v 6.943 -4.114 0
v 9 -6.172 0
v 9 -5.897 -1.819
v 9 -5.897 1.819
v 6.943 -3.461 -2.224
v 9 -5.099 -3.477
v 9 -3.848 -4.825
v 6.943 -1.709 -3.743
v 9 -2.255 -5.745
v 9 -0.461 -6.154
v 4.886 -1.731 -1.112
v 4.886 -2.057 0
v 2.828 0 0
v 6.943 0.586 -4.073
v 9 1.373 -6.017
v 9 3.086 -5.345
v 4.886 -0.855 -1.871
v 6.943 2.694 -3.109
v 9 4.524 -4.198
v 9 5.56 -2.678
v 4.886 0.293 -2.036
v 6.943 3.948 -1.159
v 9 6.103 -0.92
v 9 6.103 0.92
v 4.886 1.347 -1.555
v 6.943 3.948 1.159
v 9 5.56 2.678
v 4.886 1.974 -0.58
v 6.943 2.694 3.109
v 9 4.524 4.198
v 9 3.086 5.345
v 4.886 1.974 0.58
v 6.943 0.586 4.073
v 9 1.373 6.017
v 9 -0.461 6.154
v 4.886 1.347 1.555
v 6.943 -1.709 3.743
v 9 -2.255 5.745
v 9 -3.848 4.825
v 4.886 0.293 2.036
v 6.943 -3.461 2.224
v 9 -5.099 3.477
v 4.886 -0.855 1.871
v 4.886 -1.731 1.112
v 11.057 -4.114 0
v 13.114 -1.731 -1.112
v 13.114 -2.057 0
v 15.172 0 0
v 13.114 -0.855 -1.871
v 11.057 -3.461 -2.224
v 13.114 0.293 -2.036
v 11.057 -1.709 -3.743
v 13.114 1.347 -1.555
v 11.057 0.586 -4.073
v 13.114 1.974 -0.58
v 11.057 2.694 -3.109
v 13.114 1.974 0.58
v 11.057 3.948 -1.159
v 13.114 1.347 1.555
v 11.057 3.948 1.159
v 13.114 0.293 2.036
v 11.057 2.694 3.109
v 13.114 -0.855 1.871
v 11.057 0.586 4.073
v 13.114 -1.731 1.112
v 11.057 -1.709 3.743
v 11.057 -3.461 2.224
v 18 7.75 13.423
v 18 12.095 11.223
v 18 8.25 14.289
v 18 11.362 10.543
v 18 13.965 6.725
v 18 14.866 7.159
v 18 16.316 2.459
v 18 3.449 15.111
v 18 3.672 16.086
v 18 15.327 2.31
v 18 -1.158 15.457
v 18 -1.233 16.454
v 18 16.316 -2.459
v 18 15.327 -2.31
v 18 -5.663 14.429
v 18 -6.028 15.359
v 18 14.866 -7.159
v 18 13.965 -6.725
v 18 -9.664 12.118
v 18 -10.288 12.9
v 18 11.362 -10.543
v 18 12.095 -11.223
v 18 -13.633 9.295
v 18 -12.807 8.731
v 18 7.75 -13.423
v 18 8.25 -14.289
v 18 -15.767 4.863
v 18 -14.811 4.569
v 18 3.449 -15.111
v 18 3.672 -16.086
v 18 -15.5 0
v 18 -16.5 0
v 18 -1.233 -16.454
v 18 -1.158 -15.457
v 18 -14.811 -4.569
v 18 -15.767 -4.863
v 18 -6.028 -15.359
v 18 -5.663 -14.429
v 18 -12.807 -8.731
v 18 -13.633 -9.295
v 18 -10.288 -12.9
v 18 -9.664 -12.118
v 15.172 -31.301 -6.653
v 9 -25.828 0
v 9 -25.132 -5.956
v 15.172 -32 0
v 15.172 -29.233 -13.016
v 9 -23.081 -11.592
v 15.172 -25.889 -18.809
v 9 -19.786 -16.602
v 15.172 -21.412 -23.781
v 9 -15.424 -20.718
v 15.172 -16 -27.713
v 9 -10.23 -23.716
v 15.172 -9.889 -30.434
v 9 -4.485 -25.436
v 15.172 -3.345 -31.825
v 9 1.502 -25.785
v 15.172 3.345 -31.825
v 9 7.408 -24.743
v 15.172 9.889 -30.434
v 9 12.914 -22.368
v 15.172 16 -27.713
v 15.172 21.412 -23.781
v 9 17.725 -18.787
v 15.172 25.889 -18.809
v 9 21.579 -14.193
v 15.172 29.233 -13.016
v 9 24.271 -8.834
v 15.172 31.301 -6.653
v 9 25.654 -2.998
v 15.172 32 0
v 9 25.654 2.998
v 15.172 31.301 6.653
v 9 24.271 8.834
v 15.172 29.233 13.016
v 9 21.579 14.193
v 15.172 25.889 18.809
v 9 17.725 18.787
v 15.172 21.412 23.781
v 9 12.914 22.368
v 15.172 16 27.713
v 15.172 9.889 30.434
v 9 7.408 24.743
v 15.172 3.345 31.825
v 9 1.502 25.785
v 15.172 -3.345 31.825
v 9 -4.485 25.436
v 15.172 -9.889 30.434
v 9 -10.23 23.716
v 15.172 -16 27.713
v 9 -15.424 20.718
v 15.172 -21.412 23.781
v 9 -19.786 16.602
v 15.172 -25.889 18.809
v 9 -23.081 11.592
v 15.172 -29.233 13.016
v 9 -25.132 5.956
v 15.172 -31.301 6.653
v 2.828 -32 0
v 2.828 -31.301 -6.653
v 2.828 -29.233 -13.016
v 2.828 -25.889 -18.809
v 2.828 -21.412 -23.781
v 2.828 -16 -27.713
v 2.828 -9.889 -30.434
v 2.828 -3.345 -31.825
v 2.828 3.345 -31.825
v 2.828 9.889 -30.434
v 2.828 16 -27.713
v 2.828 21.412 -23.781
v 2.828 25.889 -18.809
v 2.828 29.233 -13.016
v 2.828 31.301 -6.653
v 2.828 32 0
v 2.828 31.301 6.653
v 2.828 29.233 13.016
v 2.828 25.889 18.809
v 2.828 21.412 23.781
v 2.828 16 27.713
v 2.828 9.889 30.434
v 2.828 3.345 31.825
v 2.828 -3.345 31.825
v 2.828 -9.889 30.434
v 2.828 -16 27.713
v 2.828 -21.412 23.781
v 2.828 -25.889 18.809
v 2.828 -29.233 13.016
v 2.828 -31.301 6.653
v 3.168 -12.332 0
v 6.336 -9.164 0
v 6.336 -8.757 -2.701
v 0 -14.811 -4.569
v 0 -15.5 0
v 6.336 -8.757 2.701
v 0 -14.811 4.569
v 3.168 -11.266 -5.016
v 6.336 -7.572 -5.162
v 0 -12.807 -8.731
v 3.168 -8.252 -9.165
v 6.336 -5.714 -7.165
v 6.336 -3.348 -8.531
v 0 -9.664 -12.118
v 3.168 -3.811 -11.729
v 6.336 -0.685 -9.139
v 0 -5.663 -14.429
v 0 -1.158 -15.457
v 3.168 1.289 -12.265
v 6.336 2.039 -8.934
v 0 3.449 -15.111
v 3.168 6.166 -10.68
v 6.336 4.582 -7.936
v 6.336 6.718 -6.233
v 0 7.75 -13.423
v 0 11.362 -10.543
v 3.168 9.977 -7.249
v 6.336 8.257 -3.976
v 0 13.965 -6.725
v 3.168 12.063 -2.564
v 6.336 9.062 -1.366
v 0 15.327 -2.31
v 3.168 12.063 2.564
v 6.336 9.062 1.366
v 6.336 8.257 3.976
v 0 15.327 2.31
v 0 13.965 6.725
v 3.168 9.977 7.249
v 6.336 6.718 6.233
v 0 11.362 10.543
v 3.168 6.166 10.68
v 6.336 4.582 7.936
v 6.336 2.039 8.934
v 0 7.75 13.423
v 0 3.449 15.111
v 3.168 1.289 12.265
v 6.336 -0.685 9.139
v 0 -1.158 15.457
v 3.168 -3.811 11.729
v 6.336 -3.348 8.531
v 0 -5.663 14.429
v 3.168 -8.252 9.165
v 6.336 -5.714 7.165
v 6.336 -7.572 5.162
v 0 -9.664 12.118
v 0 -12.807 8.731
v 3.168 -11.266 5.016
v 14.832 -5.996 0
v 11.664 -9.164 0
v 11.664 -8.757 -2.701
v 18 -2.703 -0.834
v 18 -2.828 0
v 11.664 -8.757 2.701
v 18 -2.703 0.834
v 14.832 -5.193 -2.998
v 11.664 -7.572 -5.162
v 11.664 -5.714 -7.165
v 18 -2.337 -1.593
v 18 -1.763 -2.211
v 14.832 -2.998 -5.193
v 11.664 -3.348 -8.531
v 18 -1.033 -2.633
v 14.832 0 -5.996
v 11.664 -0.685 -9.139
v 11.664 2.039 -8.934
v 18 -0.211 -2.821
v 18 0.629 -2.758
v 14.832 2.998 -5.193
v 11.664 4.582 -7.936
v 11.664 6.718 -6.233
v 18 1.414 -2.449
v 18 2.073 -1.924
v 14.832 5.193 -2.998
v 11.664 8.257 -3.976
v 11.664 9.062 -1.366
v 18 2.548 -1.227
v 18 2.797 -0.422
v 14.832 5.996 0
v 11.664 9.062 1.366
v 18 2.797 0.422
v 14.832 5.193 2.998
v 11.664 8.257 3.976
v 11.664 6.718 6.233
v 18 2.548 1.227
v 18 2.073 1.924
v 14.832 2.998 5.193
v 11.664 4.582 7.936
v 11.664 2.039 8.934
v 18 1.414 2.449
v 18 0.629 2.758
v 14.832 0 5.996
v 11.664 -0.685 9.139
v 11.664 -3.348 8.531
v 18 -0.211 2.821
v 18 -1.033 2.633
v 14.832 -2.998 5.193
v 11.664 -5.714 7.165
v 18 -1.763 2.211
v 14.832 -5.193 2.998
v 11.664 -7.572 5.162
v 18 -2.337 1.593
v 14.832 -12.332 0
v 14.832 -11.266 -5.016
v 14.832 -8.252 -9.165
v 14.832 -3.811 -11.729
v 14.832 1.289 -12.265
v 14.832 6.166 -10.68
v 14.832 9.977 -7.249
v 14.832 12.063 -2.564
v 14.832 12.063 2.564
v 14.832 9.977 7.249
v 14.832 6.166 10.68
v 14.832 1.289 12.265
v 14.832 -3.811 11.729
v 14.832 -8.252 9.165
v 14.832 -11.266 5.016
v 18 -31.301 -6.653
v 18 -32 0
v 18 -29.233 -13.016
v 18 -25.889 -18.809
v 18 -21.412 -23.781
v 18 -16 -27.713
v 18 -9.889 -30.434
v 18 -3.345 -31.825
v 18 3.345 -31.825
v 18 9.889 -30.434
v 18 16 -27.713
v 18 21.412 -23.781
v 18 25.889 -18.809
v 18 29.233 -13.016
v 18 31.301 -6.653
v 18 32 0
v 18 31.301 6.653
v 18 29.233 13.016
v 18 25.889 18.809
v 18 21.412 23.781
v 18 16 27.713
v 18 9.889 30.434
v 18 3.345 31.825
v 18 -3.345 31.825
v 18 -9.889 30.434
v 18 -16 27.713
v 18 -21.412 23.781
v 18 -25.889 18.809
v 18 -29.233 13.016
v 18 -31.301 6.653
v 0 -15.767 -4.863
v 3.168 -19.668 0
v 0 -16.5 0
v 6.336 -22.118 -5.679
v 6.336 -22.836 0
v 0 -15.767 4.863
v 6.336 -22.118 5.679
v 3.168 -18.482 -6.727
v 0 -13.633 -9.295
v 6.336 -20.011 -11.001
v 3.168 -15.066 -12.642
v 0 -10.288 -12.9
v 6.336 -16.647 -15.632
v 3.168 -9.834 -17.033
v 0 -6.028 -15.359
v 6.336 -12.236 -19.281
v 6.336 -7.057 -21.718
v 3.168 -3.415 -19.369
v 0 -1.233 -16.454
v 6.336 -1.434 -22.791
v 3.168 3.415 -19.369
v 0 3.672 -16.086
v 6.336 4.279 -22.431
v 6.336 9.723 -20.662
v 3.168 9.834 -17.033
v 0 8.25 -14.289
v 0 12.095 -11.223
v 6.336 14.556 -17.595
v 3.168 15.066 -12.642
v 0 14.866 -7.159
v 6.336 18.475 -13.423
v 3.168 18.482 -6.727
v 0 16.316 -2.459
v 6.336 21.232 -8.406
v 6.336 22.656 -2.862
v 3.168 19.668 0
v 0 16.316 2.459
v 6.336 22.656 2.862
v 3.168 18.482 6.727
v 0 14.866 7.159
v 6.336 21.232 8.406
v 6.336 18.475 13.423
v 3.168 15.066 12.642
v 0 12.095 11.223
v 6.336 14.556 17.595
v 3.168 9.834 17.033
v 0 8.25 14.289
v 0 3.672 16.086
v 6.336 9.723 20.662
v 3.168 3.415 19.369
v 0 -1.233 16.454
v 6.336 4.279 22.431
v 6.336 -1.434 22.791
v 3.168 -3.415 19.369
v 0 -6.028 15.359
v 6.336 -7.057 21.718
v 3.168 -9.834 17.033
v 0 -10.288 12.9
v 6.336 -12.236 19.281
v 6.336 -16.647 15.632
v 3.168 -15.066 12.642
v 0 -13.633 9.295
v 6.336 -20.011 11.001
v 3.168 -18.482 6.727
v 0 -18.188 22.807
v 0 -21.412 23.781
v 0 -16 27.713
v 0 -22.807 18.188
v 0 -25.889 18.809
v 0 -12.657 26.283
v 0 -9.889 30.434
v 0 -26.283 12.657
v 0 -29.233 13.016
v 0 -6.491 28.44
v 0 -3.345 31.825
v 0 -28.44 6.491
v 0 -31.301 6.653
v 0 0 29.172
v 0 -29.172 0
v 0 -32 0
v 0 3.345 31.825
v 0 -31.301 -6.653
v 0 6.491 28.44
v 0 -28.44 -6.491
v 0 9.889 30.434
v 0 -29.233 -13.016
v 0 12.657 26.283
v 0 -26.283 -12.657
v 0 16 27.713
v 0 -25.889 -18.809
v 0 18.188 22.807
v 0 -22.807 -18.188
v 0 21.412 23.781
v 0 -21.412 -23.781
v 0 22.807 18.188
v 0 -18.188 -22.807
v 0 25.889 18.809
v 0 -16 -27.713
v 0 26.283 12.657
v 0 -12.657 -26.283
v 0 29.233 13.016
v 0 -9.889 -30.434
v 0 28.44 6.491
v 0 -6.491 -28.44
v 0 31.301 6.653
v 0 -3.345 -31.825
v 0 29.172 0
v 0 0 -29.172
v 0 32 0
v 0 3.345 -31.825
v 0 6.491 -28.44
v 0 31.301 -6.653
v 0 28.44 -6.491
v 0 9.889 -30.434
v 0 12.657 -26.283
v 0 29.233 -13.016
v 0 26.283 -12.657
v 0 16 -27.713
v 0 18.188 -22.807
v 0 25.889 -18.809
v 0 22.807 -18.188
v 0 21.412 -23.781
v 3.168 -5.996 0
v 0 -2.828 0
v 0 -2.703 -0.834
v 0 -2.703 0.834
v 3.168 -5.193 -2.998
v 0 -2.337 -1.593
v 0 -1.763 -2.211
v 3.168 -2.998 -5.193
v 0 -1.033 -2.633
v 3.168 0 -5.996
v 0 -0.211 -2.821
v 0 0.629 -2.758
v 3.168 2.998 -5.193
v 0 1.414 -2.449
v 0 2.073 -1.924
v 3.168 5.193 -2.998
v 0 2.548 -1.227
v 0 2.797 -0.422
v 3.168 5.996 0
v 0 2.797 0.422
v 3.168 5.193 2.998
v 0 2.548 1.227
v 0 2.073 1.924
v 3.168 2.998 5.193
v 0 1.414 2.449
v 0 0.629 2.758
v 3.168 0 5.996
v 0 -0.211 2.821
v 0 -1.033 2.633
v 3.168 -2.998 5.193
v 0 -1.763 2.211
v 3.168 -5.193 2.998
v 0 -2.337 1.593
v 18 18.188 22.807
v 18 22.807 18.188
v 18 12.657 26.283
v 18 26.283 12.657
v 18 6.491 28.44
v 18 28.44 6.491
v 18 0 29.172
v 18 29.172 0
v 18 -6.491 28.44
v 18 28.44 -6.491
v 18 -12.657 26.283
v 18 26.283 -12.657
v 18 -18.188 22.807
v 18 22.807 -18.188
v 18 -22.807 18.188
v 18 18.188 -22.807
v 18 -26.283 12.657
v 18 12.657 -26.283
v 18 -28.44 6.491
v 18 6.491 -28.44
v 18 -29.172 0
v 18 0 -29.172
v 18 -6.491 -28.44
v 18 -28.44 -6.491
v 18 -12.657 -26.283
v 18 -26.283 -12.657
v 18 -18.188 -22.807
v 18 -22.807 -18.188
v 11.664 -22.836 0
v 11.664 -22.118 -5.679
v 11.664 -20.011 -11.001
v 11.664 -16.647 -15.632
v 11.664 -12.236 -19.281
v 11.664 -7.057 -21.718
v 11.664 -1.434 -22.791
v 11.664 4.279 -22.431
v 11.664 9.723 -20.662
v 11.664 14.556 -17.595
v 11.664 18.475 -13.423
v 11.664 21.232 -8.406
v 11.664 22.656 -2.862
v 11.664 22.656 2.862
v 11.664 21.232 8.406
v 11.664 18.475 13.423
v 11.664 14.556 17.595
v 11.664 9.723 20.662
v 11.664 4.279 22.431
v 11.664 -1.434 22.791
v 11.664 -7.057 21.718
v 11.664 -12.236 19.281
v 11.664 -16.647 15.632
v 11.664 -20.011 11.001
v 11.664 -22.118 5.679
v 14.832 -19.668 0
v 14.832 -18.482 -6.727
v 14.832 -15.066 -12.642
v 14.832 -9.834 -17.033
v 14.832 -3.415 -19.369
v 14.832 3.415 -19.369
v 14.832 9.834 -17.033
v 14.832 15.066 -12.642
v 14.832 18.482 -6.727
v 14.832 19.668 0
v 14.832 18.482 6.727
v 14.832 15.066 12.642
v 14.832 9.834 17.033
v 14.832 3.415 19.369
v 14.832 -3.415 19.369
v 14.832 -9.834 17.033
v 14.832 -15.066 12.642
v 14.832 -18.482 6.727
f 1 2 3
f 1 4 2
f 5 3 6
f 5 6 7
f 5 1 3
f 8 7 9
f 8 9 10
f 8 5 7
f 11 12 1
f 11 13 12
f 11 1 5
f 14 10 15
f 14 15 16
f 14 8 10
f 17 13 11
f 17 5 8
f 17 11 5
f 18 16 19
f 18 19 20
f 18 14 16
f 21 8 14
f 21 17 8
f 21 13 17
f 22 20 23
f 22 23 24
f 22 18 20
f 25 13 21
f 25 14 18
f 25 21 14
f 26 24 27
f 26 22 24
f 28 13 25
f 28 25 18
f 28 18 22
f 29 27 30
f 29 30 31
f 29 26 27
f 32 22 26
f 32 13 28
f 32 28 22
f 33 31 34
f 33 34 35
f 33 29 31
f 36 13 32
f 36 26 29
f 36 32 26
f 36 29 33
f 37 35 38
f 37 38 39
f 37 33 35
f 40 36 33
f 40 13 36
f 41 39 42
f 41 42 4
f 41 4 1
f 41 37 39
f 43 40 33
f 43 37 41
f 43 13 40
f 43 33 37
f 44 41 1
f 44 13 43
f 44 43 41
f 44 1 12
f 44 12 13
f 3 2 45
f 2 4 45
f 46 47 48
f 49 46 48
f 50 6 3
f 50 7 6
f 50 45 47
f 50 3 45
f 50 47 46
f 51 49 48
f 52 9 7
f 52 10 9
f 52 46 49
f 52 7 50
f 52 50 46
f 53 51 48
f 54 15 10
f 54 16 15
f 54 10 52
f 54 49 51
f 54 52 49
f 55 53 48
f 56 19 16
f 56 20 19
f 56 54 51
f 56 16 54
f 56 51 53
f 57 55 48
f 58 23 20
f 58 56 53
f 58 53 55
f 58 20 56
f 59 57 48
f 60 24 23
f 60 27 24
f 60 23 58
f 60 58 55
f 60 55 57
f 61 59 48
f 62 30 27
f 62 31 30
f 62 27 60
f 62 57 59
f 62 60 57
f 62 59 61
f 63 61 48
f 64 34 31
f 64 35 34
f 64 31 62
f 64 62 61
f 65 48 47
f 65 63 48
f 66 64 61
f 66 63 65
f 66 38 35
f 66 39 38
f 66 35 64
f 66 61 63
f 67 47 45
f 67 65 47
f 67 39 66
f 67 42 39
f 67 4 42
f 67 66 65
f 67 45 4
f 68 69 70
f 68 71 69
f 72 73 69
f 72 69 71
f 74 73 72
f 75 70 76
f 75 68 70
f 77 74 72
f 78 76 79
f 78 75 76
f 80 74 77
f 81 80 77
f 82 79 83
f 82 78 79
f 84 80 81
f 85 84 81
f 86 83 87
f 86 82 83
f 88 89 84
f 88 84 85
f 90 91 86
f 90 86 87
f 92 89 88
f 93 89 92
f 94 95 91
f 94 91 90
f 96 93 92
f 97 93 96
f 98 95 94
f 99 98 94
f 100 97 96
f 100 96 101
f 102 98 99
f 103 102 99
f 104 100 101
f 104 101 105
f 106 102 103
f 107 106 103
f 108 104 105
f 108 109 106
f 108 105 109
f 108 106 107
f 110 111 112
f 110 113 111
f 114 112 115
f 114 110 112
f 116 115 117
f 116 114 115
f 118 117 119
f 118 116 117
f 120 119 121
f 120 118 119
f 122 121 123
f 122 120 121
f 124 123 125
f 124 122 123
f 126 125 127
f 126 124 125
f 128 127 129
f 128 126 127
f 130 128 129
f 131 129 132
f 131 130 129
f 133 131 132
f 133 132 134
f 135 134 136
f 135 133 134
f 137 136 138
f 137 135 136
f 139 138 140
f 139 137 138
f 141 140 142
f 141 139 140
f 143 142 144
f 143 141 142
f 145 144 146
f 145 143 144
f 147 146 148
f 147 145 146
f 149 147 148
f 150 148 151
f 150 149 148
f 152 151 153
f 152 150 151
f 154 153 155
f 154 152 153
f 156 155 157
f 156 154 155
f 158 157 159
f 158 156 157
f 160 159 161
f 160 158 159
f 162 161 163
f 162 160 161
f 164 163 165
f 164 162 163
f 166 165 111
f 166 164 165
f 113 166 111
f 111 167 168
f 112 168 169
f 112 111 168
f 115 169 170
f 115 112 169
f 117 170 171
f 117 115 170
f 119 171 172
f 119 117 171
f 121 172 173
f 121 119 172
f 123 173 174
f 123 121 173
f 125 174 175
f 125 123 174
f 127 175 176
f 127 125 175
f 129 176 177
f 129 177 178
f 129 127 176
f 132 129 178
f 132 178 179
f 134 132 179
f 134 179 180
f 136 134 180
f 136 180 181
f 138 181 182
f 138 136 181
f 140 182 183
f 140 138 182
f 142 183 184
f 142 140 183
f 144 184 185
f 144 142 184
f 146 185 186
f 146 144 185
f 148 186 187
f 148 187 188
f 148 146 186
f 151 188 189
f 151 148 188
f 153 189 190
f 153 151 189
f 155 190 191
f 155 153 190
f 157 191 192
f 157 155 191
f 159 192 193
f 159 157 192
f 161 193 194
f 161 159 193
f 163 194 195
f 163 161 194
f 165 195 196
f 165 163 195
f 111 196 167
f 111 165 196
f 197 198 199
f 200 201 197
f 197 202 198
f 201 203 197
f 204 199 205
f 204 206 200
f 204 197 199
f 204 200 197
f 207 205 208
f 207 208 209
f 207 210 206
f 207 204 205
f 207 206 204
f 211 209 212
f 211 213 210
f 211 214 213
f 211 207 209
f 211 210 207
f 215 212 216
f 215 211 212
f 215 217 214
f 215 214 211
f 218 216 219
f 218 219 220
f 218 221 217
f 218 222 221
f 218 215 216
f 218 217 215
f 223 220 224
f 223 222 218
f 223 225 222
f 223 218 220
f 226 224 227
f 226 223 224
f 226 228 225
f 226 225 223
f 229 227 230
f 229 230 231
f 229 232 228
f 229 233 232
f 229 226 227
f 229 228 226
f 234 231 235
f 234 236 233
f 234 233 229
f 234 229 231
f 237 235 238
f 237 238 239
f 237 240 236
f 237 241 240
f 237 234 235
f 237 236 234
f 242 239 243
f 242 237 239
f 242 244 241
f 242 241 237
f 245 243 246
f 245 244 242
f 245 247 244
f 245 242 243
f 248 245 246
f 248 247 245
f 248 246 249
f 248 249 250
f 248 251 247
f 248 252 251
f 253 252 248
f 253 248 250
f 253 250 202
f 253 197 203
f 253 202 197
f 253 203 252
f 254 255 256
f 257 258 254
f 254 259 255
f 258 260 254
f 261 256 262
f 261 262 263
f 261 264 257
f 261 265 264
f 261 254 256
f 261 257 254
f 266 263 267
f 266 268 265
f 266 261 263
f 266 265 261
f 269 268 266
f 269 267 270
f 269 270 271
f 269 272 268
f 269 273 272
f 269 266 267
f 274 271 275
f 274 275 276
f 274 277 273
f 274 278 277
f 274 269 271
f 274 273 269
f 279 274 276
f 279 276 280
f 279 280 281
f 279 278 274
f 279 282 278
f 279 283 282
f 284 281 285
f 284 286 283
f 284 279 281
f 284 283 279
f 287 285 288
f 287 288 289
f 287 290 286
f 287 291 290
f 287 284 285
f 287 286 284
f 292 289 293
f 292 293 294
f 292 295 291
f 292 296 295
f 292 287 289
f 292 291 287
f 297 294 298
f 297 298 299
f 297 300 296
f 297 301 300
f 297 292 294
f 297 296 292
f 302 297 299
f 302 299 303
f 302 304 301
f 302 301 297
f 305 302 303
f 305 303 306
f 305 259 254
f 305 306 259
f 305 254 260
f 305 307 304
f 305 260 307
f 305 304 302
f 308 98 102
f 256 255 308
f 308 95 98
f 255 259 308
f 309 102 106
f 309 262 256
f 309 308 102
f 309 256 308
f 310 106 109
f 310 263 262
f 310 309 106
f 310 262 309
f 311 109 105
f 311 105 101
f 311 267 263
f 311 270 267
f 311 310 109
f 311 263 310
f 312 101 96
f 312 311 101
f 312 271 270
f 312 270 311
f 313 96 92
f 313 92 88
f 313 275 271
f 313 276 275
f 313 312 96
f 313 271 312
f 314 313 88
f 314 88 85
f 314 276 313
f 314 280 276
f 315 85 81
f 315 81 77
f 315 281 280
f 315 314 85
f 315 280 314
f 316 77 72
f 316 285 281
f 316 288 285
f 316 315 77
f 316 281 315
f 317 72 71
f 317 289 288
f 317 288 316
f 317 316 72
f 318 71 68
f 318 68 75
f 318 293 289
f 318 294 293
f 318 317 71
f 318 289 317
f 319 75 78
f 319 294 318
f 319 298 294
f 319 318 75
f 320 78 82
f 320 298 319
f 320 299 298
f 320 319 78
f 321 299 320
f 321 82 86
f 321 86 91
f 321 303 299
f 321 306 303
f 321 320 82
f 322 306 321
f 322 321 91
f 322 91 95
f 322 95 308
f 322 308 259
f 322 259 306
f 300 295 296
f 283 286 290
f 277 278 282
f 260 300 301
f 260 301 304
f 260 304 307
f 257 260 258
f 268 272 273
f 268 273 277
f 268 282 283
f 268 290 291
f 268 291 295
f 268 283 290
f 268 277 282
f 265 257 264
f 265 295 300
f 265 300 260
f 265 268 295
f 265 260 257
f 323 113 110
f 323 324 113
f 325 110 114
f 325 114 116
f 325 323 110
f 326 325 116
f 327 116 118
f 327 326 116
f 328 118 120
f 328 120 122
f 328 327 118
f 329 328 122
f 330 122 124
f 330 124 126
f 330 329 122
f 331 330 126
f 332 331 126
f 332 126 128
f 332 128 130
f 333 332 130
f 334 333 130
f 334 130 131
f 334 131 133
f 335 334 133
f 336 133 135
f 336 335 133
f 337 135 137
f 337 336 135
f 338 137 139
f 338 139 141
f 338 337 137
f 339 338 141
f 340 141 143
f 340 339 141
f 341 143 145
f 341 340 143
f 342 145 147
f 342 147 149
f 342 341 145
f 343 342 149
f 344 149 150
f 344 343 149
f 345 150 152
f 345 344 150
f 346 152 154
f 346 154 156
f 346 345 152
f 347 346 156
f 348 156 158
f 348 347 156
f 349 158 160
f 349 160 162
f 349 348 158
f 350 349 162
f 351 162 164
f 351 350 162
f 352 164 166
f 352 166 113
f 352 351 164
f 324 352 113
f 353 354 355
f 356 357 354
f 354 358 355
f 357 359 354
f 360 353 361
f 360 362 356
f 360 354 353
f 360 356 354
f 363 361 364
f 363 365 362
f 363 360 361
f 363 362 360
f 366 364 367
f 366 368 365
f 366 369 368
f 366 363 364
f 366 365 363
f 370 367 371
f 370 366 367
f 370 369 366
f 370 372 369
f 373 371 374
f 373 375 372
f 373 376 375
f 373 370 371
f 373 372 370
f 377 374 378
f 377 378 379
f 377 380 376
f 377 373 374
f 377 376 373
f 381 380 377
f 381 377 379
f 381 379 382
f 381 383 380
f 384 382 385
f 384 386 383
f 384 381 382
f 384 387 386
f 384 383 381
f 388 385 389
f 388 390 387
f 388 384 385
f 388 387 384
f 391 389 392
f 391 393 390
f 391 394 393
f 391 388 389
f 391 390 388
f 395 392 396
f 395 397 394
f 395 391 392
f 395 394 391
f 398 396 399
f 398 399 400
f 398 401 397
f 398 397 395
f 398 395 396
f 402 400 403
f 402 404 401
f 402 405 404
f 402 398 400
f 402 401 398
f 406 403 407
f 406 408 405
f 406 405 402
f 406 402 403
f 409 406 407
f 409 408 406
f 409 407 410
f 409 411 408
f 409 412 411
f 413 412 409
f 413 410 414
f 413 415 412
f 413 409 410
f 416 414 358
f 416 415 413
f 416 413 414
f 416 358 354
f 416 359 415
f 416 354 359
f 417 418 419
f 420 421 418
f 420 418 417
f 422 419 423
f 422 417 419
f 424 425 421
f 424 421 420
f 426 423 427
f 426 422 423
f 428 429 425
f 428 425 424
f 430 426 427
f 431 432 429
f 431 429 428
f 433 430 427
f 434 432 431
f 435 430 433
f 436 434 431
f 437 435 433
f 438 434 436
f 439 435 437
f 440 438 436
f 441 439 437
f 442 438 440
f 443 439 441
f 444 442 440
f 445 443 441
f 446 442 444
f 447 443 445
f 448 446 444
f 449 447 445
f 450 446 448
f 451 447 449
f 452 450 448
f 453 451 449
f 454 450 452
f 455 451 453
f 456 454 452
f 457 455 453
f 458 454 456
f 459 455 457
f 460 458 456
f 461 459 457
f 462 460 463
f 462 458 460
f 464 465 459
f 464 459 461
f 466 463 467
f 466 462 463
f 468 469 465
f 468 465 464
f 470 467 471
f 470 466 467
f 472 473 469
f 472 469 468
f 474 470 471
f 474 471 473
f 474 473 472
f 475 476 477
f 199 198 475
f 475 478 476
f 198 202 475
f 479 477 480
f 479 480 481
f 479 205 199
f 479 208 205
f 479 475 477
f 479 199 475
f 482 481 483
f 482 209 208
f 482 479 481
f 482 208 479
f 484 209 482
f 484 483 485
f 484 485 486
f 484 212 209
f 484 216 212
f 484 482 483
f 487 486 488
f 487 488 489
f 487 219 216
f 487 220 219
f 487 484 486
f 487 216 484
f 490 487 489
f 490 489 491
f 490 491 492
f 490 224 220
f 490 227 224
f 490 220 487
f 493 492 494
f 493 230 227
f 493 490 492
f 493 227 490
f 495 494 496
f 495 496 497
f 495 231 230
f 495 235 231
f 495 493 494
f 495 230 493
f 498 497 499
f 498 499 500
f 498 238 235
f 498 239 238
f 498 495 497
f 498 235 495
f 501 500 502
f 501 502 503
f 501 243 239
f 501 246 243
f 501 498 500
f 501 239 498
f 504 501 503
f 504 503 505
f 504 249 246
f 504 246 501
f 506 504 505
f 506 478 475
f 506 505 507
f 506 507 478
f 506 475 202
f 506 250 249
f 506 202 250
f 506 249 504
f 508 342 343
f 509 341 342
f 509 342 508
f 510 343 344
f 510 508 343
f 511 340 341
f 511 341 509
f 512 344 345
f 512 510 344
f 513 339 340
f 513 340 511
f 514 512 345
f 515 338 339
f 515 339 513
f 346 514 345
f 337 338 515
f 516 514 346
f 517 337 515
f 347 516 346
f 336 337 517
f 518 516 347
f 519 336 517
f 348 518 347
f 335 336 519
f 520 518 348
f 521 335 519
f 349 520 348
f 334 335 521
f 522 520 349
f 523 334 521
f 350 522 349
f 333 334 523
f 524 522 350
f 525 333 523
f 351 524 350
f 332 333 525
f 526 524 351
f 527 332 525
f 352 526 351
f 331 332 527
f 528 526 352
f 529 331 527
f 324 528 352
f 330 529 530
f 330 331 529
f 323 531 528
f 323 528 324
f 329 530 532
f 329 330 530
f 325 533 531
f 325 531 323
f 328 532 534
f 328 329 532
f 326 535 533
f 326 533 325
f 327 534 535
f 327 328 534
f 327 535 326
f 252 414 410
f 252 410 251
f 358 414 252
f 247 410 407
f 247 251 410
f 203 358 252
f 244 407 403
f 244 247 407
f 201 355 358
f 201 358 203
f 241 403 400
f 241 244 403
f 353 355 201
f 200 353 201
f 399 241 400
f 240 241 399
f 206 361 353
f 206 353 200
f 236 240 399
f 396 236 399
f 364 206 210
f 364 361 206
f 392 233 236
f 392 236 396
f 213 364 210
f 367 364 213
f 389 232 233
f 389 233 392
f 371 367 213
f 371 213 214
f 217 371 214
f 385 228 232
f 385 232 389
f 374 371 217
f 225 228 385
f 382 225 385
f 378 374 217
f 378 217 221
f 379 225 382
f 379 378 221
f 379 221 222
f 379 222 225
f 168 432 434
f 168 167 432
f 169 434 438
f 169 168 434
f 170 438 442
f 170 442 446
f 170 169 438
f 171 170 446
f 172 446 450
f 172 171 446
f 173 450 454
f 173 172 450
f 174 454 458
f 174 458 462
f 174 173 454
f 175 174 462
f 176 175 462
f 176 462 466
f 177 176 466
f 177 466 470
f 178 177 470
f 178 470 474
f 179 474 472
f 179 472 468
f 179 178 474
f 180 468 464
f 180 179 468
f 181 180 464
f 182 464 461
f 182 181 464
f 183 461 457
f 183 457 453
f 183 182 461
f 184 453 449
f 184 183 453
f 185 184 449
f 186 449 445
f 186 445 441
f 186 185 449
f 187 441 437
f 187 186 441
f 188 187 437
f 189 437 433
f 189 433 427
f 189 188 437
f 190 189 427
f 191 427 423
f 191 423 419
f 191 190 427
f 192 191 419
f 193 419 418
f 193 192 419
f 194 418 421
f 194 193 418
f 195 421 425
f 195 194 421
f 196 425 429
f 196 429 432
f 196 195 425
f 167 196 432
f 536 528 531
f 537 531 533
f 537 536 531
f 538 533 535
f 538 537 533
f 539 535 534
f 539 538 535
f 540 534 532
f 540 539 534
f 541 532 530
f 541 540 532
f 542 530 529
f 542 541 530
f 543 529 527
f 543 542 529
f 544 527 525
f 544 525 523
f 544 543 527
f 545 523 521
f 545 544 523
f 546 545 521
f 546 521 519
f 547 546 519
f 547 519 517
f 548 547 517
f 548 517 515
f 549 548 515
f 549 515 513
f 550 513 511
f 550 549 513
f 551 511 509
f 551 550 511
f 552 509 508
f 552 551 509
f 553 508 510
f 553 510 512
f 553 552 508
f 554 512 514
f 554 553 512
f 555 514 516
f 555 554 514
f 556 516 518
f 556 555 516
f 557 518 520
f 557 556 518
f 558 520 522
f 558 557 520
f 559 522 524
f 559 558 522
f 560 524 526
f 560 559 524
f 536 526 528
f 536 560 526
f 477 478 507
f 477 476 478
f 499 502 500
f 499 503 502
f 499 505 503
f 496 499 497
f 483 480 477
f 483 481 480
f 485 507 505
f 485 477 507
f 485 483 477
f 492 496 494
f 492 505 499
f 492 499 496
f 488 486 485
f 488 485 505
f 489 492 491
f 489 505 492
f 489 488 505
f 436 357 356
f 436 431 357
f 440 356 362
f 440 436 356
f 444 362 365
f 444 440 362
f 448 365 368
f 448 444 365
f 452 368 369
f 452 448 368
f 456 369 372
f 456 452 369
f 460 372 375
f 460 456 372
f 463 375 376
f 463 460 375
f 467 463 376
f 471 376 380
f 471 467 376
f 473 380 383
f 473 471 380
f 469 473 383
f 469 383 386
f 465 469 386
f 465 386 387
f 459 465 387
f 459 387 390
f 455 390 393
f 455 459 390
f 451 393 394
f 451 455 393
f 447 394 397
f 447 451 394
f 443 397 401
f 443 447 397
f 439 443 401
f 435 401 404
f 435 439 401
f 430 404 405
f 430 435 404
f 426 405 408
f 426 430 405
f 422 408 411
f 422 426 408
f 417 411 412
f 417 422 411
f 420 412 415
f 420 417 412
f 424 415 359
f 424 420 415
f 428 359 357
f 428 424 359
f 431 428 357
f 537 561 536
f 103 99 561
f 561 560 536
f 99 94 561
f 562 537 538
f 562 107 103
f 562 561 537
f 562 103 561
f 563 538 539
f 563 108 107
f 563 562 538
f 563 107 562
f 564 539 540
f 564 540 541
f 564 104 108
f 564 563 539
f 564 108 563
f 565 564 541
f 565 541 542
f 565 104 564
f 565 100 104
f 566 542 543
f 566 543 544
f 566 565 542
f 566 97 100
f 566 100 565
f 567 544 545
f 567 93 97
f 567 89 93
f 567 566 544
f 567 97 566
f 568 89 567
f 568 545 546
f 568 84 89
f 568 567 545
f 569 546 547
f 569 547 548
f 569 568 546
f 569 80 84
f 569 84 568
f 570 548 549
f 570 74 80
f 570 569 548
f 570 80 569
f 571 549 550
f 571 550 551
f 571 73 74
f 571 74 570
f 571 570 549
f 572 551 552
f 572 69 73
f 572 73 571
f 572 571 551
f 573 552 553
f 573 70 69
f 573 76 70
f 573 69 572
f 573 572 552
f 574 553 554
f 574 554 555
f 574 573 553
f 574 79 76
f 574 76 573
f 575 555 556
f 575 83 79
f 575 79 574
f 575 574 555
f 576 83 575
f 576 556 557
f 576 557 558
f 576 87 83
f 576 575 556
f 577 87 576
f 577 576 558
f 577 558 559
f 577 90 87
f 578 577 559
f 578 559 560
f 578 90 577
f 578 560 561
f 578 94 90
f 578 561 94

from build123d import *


with BuildPart() as f1:
    # F0 (on Top) → F1 (revolve)
    with BuildSketch(Plane.XY):
        Polygon((2.828427, 0), (0, 0), (0, -2.828427), (6.335786, -9.164214), (0, -15.5), (0, -16.5), (6.335786, -22.835786), (0, -29.171573), (0, -32), (2.828427, -32), (9, -25.828427), (15.171573, -32), (18, -32), (18, -29.171573), (11.664214, -22.835786), (18, -16.5), (18, -15.5), (11.664214, -9.164214), (18, -2.828427), (18, 0), (15.171573, 0), (9, -6.171573), align=None)
        Polygon((5.156854, -16), (9, -12.156854), (12.843146, -16), (9, -19.843146), align=None, mode=Mode.SUBTRACT)
        Polygon((12.843146, -16), (9, -12.156854), (5.156854, -16), (9, -19.843146), align=None)
    revolve(axis=Axis((16.585786, 0, 0), (1, 0, 0)))


solid = f1.part
